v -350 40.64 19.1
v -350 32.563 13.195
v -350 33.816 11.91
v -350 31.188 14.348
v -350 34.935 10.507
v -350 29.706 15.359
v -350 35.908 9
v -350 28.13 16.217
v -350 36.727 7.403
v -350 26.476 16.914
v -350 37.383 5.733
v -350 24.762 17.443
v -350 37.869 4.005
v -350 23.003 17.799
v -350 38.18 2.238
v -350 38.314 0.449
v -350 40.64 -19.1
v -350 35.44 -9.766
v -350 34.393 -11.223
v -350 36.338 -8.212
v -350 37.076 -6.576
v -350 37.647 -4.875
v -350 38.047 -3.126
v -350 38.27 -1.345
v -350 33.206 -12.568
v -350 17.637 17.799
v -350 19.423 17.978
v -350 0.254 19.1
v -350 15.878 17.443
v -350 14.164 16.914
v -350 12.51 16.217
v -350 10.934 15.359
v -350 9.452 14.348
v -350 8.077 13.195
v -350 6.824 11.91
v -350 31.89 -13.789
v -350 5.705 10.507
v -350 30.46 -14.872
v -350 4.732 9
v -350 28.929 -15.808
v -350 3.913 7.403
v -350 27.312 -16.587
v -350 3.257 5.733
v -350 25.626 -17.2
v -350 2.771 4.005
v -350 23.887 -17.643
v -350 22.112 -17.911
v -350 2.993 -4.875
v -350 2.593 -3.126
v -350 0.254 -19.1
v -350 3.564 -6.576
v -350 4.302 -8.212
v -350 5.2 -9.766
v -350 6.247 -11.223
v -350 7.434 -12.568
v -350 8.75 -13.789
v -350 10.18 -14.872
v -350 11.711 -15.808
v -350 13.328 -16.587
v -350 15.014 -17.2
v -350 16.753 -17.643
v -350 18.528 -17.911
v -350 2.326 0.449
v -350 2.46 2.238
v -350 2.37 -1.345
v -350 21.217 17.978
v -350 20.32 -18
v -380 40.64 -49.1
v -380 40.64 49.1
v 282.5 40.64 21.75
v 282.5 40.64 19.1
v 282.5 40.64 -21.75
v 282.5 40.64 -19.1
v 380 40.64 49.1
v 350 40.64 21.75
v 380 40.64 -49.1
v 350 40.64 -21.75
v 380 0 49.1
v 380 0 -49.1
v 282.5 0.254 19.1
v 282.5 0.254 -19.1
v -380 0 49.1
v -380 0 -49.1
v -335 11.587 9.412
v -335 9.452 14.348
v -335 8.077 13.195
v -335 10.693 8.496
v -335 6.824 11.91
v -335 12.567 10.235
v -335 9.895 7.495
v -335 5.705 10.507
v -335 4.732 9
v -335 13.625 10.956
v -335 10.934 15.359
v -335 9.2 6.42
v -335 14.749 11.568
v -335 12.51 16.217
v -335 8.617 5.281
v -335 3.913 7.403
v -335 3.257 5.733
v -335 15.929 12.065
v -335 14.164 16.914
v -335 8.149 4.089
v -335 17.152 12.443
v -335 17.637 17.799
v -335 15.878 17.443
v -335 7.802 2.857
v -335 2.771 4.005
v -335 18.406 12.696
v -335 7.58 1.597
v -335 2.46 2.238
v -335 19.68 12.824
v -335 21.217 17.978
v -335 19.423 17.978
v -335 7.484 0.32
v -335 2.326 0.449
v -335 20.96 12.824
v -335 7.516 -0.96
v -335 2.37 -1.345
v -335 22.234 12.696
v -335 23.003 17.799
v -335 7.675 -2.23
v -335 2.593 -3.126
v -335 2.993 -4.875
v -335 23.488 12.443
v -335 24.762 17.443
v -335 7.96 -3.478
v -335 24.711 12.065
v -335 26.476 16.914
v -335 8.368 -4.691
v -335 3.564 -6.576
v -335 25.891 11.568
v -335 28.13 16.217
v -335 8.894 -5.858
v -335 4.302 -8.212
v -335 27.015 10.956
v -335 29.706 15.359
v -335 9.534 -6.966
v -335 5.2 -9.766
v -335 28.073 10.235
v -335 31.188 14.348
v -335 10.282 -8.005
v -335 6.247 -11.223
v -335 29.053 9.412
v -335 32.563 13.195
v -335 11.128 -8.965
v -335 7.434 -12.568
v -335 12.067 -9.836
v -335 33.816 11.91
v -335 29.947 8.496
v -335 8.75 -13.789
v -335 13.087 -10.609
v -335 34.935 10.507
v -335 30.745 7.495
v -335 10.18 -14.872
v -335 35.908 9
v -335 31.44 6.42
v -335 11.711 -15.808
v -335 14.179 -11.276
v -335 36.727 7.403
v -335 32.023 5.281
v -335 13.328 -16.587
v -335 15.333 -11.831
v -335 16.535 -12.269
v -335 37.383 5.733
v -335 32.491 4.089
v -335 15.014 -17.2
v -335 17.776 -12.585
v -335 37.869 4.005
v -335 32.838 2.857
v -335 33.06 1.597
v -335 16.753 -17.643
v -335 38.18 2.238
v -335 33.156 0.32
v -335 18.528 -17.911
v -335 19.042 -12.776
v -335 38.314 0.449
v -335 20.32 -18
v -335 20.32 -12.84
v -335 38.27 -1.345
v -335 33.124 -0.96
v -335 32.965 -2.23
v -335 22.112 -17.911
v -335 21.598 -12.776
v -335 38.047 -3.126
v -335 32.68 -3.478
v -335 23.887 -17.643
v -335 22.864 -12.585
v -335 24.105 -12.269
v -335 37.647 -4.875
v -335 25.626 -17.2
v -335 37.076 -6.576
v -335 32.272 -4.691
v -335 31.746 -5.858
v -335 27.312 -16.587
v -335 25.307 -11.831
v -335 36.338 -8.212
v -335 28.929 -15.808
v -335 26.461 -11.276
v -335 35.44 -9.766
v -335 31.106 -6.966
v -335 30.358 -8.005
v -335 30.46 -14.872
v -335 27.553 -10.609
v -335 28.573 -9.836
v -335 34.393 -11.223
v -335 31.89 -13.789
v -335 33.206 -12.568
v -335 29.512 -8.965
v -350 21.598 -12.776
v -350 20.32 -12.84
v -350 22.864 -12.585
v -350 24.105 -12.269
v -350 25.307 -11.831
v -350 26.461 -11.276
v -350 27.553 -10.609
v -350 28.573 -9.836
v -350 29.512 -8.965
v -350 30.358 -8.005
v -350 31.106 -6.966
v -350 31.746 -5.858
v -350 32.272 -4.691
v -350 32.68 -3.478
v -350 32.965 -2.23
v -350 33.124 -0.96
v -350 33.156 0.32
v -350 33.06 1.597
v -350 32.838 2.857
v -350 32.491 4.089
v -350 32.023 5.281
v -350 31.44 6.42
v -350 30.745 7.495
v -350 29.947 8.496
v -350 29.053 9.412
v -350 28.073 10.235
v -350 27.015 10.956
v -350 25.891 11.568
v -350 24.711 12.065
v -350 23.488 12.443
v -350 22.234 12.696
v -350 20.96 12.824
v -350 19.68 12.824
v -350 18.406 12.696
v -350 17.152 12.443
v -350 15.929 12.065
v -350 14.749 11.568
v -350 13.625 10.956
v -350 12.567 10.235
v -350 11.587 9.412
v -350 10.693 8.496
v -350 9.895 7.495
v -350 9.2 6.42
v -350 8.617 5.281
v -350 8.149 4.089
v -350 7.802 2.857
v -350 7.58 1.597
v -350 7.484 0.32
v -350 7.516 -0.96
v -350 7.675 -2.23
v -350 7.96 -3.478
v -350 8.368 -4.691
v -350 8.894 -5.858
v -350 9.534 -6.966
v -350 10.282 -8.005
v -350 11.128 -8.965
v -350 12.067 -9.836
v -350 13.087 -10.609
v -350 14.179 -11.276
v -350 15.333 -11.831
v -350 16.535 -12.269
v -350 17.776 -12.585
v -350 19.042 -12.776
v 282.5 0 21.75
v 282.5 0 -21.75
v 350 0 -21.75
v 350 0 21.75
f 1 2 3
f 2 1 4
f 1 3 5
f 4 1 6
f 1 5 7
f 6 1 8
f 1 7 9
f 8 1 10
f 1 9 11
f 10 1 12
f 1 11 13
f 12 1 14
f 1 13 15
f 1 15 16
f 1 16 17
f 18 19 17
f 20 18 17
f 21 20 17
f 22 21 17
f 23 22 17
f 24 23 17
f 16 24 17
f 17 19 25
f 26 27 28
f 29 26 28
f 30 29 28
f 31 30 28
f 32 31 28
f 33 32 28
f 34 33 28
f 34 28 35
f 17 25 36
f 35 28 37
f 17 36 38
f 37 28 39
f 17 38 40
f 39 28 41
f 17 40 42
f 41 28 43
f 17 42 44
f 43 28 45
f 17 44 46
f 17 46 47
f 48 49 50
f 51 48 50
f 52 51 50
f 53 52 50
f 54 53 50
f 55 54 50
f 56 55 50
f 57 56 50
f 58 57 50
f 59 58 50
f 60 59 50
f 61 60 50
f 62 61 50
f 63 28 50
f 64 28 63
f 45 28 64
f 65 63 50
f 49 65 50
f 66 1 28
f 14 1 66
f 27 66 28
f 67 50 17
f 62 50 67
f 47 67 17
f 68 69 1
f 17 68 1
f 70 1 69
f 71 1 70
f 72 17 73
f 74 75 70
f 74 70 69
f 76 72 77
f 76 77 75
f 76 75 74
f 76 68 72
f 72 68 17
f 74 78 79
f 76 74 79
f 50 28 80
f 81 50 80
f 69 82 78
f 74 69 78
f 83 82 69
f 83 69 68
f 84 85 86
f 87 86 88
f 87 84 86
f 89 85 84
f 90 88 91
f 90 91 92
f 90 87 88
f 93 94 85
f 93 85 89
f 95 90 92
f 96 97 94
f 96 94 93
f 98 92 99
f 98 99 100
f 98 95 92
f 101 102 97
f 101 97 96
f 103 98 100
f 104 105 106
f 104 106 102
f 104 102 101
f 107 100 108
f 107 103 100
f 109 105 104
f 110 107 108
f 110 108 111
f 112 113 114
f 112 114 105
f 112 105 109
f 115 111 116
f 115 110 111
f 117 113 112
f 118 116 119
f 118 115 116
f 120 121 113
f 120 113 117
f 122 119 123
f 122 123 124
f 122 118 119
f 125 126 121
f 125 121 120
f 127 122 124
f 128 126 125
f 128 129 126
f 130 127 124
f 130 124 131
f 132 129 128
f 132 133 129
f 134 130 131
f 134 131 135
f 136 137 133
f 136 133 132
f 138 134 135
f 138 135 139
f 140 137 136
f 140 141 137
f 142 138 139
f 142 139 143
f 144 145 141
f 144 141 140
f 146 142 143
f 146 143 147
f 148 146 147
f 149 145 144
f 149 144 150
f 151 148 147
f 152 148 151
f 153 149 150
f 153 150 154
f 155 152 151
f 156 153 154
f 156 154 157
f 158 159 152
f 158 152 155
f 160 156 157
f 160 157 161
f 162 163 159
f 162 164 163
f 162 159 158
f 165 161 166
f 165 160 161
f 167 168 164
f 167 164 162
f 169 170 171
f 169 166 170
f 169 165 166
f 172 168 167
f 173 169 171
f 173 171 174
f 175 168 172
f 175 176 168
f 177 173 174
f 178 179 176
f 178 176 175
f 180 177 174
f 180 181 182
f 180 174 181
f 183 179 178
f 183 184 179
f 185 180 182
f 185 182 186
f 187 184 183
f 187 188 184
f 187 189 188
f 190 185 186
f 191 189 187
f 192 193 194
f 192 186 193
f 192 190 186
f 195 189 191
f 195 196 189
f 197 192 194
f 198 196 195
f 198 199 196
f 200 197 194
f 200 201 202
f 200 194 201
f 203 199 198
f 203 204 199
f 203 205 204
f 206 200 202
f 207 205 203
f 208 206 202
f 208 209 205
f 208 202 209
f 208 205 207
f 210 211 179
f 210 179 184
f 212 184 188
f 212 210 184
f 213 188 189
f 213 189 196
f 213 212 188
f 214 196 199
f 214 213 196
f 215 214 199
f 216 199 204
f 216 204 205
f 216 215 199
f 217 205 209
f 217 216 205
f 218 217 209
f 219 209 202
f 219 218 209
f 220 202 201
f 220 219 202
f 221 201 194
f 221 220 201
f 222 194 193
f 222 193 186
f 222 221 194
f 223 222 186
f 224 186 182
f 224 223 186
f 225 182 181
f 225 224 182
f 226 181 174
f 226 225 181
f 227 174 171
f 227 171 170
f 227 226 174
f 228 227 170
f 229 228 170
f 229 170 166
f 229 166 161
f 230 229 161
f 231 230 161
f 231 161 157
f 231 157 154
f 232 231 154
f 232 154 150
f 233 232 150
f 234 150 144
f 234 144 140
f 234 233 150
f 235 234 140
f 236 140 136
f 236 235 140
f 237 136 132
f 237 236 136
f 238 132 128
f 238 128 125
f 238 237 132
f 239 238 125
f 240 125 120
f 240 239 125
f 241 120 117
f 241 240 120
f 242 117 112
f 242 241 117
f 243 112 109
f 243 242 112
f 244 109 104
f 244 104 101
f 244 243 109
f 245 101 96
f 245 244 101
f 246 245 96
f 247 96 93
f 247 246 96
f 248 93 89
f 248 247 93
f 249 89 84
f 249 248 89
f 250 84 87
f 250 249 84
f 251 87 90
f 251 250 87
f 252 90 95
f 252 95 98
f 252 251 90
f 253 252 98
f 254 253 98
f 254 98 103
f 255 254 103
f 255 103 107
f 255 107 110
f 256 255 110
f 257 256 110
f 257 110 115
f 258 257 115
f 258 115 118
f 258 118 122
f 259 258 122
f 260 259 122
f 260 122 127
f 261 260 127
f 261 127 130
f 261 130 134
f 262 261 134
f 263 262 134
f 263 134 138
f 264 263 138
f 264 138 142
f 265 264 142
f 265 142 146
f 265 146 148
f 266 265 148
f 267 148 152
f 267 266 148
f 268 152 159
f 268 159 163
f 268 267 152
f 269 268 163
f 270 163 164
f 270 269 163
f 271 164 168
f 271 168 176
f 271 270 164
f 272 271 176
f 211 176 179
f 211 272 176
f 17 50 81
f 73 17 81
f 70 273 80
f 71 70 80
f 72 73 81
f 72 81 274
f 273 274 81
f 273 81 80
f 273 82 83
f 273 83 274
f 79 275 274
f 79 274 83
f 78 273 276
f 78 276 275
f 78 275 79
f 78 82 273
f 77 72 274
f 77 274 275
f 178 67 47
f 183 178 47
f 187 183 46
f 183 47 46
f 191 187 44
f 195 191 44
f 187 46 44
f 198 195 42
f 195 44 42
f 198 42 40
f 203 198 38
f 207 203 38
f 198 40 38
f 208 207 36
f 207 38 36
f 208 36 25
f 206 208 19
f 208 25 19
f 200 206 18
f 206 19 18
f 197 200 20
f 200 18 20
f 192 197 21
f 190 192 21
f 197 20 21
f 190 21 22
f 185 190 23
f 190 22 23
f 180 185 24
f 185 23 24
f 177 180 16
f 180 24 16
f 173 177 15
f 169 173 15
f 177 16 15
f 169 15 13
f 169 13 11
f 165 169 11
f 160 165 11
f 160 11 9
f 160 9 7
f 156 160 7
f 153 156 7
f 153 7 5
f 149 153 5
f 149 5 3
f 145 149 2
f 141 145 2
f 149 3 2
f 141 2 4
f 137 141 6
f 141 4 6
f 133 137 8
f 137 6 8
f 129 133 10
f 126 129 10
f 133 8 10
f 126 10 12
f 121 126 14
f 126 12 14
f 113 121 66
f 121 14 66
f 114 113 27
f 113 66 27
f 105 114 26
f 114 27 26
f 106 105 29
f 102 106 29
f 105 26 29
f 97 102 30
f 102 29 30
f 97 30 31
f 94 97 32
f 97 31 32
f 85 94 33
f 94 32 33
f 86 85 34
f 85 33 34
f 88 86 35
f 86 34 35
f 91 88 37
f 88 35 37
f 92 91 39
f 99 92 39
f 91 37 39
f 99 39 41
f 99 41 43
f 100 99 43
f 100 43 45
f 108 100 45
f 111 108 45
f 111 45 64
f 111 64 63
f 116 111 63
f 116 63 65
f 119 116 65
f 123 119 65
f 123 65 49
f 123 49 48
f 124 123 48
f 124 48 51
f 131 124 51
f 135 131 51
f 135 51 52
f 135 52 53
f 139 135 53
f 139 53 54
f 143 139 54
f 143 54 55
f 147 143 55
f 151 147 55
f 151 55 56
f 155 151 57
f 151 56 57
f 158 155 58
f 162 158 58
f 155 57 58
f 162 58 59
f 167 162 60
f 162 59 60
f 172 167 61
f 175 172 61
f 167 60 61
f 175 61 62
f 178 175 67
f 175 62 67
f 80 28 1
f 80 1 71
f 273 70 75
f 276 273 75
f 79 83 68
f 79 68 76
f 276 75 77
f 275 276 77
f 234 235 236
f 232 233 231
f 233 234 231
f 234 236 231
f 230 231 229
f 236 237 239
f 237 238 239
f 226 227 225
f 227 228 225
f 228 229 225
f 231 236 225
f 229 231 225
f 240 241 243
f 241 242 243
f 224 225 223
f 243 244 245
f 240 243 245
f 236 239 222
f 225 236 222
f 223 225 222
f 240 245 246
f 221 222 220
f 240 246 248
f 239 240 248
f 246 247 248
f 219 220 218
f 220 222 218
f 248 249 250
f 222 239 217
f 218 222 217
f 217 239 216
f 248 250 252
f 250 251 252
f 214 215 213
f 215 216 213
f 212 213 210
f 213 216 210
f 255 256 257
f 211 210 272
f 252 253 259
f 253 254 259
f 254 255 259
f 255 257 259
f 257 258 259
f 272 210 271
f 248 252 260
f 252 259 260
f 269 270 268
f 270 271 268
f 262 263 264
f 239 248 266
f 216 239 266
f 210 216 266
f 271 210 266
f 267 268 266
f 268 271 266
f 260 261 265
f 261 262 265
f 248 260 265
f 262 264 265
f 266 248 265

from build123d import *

# Parameters (mm, degrees)
SKETCH1_W           = 760
SKETCH1_H           = 98.2
SKETCH1_W_2         = 700
SKETCH1_H_2         = 38.2
BOSS_EXTRUDE3_DEPTH = 40.64
SKETCH2_W           = 700
SKETCH2_H           = 38.2
BOSS_EXTRUDE4_DEPTH = 0.254
SKETCH3_W           = 67.5
SKETCH3_H           = 43.5
CUT_EXTRUDE1_DEPTH  = 40.386
CUT_EXTRUDE5_REACH  = 387.308
SKETCH5_W           = 67.5
SKETCH5_H           = 43.5
SKETCH6_R           = 18
SKETCH6_R_2         = 12.8397
BOSS_EXTRUDE5_DEPTH = 15


with BuildPart() as part:
    # Sketch1 → Boss-Extrude3 (new body)
    with BuildSketch(Plane(origin=(0, 0, 0), x_dir=(1, 0, 0), z_dir=(0, 1, 0))):
        Rectangle(SKETCH1_W, SKETCH1_H)
        Rectangle(SKETCH1_W_2, SKETCH1_H_2, mode=Mode.SUBTRACT)
    extrude(amount=BOSS_EXTRUDE3_DEPTH)

    # Sketch2 → Boss-Extrude4 (add)
    with BuildSketch(Plane.XZ):
        Rectangle(SKETCH2_W, SKETCH2_H)
    extrude(amount=-BOSS_EXTRUDE4_DEPTH)

    # Sketch3 → Cut-Extrude1 (cut)
    with BuildSketch(Plane(origin=(0, 40.64, 0), x_dir=(1, 0, 0), z_dir=(0, 1, 0))):
        with Locations((316.25, 0)):
            Rectangle(SKETCH3_W, SKETCH3_H)
    extrude(amount=-CUT_EXTRUDE1_DEPTH, mode=Mode.SUBTRACT)

    # Sketch5 → Cut-Extrude5 (cut, up to next)
    with BuildSketch(Plane(origin=(0, 40.64, 0), x_dir=(1, 0, 0), z_dir=(0, 1, 0)), mode=Mode.PRIVATE) as cut_extrude5_sk1:
        with Locations((316.25, 0)):
            Rectangle(SKETCH5_W, SKETCH5_H)
    cut_extrude5_tool1 = extrude(cut_extrude5_sk1.sketch, amount=-CUT_EXTRUDE5_REACH, mode=Mode.PRIVATE) & part.part
    add(cut_extrude5_tool1.solids().sort_by_distance((316.25, 40.64, 0))[0], mode=Mode.SUBTRACT)

    # Sketch6 → Boss-Extrude5 (add)
    with BuildSketch(Plane(origin=(-350, 0, 0), x_dir=(0, 0, -1), z_dir=(1, 0, 0))):
        with Locations((0, 20.32)):
            Circle(SKETCH6_R)
        with Locations((0, 20.32)):
            Circle(SKETCH6_R_2, mode=Mode.SUBTRACT)
    extrude(amount=BOSS_EXTRUDE5_DEPTH)


solid = part.part
